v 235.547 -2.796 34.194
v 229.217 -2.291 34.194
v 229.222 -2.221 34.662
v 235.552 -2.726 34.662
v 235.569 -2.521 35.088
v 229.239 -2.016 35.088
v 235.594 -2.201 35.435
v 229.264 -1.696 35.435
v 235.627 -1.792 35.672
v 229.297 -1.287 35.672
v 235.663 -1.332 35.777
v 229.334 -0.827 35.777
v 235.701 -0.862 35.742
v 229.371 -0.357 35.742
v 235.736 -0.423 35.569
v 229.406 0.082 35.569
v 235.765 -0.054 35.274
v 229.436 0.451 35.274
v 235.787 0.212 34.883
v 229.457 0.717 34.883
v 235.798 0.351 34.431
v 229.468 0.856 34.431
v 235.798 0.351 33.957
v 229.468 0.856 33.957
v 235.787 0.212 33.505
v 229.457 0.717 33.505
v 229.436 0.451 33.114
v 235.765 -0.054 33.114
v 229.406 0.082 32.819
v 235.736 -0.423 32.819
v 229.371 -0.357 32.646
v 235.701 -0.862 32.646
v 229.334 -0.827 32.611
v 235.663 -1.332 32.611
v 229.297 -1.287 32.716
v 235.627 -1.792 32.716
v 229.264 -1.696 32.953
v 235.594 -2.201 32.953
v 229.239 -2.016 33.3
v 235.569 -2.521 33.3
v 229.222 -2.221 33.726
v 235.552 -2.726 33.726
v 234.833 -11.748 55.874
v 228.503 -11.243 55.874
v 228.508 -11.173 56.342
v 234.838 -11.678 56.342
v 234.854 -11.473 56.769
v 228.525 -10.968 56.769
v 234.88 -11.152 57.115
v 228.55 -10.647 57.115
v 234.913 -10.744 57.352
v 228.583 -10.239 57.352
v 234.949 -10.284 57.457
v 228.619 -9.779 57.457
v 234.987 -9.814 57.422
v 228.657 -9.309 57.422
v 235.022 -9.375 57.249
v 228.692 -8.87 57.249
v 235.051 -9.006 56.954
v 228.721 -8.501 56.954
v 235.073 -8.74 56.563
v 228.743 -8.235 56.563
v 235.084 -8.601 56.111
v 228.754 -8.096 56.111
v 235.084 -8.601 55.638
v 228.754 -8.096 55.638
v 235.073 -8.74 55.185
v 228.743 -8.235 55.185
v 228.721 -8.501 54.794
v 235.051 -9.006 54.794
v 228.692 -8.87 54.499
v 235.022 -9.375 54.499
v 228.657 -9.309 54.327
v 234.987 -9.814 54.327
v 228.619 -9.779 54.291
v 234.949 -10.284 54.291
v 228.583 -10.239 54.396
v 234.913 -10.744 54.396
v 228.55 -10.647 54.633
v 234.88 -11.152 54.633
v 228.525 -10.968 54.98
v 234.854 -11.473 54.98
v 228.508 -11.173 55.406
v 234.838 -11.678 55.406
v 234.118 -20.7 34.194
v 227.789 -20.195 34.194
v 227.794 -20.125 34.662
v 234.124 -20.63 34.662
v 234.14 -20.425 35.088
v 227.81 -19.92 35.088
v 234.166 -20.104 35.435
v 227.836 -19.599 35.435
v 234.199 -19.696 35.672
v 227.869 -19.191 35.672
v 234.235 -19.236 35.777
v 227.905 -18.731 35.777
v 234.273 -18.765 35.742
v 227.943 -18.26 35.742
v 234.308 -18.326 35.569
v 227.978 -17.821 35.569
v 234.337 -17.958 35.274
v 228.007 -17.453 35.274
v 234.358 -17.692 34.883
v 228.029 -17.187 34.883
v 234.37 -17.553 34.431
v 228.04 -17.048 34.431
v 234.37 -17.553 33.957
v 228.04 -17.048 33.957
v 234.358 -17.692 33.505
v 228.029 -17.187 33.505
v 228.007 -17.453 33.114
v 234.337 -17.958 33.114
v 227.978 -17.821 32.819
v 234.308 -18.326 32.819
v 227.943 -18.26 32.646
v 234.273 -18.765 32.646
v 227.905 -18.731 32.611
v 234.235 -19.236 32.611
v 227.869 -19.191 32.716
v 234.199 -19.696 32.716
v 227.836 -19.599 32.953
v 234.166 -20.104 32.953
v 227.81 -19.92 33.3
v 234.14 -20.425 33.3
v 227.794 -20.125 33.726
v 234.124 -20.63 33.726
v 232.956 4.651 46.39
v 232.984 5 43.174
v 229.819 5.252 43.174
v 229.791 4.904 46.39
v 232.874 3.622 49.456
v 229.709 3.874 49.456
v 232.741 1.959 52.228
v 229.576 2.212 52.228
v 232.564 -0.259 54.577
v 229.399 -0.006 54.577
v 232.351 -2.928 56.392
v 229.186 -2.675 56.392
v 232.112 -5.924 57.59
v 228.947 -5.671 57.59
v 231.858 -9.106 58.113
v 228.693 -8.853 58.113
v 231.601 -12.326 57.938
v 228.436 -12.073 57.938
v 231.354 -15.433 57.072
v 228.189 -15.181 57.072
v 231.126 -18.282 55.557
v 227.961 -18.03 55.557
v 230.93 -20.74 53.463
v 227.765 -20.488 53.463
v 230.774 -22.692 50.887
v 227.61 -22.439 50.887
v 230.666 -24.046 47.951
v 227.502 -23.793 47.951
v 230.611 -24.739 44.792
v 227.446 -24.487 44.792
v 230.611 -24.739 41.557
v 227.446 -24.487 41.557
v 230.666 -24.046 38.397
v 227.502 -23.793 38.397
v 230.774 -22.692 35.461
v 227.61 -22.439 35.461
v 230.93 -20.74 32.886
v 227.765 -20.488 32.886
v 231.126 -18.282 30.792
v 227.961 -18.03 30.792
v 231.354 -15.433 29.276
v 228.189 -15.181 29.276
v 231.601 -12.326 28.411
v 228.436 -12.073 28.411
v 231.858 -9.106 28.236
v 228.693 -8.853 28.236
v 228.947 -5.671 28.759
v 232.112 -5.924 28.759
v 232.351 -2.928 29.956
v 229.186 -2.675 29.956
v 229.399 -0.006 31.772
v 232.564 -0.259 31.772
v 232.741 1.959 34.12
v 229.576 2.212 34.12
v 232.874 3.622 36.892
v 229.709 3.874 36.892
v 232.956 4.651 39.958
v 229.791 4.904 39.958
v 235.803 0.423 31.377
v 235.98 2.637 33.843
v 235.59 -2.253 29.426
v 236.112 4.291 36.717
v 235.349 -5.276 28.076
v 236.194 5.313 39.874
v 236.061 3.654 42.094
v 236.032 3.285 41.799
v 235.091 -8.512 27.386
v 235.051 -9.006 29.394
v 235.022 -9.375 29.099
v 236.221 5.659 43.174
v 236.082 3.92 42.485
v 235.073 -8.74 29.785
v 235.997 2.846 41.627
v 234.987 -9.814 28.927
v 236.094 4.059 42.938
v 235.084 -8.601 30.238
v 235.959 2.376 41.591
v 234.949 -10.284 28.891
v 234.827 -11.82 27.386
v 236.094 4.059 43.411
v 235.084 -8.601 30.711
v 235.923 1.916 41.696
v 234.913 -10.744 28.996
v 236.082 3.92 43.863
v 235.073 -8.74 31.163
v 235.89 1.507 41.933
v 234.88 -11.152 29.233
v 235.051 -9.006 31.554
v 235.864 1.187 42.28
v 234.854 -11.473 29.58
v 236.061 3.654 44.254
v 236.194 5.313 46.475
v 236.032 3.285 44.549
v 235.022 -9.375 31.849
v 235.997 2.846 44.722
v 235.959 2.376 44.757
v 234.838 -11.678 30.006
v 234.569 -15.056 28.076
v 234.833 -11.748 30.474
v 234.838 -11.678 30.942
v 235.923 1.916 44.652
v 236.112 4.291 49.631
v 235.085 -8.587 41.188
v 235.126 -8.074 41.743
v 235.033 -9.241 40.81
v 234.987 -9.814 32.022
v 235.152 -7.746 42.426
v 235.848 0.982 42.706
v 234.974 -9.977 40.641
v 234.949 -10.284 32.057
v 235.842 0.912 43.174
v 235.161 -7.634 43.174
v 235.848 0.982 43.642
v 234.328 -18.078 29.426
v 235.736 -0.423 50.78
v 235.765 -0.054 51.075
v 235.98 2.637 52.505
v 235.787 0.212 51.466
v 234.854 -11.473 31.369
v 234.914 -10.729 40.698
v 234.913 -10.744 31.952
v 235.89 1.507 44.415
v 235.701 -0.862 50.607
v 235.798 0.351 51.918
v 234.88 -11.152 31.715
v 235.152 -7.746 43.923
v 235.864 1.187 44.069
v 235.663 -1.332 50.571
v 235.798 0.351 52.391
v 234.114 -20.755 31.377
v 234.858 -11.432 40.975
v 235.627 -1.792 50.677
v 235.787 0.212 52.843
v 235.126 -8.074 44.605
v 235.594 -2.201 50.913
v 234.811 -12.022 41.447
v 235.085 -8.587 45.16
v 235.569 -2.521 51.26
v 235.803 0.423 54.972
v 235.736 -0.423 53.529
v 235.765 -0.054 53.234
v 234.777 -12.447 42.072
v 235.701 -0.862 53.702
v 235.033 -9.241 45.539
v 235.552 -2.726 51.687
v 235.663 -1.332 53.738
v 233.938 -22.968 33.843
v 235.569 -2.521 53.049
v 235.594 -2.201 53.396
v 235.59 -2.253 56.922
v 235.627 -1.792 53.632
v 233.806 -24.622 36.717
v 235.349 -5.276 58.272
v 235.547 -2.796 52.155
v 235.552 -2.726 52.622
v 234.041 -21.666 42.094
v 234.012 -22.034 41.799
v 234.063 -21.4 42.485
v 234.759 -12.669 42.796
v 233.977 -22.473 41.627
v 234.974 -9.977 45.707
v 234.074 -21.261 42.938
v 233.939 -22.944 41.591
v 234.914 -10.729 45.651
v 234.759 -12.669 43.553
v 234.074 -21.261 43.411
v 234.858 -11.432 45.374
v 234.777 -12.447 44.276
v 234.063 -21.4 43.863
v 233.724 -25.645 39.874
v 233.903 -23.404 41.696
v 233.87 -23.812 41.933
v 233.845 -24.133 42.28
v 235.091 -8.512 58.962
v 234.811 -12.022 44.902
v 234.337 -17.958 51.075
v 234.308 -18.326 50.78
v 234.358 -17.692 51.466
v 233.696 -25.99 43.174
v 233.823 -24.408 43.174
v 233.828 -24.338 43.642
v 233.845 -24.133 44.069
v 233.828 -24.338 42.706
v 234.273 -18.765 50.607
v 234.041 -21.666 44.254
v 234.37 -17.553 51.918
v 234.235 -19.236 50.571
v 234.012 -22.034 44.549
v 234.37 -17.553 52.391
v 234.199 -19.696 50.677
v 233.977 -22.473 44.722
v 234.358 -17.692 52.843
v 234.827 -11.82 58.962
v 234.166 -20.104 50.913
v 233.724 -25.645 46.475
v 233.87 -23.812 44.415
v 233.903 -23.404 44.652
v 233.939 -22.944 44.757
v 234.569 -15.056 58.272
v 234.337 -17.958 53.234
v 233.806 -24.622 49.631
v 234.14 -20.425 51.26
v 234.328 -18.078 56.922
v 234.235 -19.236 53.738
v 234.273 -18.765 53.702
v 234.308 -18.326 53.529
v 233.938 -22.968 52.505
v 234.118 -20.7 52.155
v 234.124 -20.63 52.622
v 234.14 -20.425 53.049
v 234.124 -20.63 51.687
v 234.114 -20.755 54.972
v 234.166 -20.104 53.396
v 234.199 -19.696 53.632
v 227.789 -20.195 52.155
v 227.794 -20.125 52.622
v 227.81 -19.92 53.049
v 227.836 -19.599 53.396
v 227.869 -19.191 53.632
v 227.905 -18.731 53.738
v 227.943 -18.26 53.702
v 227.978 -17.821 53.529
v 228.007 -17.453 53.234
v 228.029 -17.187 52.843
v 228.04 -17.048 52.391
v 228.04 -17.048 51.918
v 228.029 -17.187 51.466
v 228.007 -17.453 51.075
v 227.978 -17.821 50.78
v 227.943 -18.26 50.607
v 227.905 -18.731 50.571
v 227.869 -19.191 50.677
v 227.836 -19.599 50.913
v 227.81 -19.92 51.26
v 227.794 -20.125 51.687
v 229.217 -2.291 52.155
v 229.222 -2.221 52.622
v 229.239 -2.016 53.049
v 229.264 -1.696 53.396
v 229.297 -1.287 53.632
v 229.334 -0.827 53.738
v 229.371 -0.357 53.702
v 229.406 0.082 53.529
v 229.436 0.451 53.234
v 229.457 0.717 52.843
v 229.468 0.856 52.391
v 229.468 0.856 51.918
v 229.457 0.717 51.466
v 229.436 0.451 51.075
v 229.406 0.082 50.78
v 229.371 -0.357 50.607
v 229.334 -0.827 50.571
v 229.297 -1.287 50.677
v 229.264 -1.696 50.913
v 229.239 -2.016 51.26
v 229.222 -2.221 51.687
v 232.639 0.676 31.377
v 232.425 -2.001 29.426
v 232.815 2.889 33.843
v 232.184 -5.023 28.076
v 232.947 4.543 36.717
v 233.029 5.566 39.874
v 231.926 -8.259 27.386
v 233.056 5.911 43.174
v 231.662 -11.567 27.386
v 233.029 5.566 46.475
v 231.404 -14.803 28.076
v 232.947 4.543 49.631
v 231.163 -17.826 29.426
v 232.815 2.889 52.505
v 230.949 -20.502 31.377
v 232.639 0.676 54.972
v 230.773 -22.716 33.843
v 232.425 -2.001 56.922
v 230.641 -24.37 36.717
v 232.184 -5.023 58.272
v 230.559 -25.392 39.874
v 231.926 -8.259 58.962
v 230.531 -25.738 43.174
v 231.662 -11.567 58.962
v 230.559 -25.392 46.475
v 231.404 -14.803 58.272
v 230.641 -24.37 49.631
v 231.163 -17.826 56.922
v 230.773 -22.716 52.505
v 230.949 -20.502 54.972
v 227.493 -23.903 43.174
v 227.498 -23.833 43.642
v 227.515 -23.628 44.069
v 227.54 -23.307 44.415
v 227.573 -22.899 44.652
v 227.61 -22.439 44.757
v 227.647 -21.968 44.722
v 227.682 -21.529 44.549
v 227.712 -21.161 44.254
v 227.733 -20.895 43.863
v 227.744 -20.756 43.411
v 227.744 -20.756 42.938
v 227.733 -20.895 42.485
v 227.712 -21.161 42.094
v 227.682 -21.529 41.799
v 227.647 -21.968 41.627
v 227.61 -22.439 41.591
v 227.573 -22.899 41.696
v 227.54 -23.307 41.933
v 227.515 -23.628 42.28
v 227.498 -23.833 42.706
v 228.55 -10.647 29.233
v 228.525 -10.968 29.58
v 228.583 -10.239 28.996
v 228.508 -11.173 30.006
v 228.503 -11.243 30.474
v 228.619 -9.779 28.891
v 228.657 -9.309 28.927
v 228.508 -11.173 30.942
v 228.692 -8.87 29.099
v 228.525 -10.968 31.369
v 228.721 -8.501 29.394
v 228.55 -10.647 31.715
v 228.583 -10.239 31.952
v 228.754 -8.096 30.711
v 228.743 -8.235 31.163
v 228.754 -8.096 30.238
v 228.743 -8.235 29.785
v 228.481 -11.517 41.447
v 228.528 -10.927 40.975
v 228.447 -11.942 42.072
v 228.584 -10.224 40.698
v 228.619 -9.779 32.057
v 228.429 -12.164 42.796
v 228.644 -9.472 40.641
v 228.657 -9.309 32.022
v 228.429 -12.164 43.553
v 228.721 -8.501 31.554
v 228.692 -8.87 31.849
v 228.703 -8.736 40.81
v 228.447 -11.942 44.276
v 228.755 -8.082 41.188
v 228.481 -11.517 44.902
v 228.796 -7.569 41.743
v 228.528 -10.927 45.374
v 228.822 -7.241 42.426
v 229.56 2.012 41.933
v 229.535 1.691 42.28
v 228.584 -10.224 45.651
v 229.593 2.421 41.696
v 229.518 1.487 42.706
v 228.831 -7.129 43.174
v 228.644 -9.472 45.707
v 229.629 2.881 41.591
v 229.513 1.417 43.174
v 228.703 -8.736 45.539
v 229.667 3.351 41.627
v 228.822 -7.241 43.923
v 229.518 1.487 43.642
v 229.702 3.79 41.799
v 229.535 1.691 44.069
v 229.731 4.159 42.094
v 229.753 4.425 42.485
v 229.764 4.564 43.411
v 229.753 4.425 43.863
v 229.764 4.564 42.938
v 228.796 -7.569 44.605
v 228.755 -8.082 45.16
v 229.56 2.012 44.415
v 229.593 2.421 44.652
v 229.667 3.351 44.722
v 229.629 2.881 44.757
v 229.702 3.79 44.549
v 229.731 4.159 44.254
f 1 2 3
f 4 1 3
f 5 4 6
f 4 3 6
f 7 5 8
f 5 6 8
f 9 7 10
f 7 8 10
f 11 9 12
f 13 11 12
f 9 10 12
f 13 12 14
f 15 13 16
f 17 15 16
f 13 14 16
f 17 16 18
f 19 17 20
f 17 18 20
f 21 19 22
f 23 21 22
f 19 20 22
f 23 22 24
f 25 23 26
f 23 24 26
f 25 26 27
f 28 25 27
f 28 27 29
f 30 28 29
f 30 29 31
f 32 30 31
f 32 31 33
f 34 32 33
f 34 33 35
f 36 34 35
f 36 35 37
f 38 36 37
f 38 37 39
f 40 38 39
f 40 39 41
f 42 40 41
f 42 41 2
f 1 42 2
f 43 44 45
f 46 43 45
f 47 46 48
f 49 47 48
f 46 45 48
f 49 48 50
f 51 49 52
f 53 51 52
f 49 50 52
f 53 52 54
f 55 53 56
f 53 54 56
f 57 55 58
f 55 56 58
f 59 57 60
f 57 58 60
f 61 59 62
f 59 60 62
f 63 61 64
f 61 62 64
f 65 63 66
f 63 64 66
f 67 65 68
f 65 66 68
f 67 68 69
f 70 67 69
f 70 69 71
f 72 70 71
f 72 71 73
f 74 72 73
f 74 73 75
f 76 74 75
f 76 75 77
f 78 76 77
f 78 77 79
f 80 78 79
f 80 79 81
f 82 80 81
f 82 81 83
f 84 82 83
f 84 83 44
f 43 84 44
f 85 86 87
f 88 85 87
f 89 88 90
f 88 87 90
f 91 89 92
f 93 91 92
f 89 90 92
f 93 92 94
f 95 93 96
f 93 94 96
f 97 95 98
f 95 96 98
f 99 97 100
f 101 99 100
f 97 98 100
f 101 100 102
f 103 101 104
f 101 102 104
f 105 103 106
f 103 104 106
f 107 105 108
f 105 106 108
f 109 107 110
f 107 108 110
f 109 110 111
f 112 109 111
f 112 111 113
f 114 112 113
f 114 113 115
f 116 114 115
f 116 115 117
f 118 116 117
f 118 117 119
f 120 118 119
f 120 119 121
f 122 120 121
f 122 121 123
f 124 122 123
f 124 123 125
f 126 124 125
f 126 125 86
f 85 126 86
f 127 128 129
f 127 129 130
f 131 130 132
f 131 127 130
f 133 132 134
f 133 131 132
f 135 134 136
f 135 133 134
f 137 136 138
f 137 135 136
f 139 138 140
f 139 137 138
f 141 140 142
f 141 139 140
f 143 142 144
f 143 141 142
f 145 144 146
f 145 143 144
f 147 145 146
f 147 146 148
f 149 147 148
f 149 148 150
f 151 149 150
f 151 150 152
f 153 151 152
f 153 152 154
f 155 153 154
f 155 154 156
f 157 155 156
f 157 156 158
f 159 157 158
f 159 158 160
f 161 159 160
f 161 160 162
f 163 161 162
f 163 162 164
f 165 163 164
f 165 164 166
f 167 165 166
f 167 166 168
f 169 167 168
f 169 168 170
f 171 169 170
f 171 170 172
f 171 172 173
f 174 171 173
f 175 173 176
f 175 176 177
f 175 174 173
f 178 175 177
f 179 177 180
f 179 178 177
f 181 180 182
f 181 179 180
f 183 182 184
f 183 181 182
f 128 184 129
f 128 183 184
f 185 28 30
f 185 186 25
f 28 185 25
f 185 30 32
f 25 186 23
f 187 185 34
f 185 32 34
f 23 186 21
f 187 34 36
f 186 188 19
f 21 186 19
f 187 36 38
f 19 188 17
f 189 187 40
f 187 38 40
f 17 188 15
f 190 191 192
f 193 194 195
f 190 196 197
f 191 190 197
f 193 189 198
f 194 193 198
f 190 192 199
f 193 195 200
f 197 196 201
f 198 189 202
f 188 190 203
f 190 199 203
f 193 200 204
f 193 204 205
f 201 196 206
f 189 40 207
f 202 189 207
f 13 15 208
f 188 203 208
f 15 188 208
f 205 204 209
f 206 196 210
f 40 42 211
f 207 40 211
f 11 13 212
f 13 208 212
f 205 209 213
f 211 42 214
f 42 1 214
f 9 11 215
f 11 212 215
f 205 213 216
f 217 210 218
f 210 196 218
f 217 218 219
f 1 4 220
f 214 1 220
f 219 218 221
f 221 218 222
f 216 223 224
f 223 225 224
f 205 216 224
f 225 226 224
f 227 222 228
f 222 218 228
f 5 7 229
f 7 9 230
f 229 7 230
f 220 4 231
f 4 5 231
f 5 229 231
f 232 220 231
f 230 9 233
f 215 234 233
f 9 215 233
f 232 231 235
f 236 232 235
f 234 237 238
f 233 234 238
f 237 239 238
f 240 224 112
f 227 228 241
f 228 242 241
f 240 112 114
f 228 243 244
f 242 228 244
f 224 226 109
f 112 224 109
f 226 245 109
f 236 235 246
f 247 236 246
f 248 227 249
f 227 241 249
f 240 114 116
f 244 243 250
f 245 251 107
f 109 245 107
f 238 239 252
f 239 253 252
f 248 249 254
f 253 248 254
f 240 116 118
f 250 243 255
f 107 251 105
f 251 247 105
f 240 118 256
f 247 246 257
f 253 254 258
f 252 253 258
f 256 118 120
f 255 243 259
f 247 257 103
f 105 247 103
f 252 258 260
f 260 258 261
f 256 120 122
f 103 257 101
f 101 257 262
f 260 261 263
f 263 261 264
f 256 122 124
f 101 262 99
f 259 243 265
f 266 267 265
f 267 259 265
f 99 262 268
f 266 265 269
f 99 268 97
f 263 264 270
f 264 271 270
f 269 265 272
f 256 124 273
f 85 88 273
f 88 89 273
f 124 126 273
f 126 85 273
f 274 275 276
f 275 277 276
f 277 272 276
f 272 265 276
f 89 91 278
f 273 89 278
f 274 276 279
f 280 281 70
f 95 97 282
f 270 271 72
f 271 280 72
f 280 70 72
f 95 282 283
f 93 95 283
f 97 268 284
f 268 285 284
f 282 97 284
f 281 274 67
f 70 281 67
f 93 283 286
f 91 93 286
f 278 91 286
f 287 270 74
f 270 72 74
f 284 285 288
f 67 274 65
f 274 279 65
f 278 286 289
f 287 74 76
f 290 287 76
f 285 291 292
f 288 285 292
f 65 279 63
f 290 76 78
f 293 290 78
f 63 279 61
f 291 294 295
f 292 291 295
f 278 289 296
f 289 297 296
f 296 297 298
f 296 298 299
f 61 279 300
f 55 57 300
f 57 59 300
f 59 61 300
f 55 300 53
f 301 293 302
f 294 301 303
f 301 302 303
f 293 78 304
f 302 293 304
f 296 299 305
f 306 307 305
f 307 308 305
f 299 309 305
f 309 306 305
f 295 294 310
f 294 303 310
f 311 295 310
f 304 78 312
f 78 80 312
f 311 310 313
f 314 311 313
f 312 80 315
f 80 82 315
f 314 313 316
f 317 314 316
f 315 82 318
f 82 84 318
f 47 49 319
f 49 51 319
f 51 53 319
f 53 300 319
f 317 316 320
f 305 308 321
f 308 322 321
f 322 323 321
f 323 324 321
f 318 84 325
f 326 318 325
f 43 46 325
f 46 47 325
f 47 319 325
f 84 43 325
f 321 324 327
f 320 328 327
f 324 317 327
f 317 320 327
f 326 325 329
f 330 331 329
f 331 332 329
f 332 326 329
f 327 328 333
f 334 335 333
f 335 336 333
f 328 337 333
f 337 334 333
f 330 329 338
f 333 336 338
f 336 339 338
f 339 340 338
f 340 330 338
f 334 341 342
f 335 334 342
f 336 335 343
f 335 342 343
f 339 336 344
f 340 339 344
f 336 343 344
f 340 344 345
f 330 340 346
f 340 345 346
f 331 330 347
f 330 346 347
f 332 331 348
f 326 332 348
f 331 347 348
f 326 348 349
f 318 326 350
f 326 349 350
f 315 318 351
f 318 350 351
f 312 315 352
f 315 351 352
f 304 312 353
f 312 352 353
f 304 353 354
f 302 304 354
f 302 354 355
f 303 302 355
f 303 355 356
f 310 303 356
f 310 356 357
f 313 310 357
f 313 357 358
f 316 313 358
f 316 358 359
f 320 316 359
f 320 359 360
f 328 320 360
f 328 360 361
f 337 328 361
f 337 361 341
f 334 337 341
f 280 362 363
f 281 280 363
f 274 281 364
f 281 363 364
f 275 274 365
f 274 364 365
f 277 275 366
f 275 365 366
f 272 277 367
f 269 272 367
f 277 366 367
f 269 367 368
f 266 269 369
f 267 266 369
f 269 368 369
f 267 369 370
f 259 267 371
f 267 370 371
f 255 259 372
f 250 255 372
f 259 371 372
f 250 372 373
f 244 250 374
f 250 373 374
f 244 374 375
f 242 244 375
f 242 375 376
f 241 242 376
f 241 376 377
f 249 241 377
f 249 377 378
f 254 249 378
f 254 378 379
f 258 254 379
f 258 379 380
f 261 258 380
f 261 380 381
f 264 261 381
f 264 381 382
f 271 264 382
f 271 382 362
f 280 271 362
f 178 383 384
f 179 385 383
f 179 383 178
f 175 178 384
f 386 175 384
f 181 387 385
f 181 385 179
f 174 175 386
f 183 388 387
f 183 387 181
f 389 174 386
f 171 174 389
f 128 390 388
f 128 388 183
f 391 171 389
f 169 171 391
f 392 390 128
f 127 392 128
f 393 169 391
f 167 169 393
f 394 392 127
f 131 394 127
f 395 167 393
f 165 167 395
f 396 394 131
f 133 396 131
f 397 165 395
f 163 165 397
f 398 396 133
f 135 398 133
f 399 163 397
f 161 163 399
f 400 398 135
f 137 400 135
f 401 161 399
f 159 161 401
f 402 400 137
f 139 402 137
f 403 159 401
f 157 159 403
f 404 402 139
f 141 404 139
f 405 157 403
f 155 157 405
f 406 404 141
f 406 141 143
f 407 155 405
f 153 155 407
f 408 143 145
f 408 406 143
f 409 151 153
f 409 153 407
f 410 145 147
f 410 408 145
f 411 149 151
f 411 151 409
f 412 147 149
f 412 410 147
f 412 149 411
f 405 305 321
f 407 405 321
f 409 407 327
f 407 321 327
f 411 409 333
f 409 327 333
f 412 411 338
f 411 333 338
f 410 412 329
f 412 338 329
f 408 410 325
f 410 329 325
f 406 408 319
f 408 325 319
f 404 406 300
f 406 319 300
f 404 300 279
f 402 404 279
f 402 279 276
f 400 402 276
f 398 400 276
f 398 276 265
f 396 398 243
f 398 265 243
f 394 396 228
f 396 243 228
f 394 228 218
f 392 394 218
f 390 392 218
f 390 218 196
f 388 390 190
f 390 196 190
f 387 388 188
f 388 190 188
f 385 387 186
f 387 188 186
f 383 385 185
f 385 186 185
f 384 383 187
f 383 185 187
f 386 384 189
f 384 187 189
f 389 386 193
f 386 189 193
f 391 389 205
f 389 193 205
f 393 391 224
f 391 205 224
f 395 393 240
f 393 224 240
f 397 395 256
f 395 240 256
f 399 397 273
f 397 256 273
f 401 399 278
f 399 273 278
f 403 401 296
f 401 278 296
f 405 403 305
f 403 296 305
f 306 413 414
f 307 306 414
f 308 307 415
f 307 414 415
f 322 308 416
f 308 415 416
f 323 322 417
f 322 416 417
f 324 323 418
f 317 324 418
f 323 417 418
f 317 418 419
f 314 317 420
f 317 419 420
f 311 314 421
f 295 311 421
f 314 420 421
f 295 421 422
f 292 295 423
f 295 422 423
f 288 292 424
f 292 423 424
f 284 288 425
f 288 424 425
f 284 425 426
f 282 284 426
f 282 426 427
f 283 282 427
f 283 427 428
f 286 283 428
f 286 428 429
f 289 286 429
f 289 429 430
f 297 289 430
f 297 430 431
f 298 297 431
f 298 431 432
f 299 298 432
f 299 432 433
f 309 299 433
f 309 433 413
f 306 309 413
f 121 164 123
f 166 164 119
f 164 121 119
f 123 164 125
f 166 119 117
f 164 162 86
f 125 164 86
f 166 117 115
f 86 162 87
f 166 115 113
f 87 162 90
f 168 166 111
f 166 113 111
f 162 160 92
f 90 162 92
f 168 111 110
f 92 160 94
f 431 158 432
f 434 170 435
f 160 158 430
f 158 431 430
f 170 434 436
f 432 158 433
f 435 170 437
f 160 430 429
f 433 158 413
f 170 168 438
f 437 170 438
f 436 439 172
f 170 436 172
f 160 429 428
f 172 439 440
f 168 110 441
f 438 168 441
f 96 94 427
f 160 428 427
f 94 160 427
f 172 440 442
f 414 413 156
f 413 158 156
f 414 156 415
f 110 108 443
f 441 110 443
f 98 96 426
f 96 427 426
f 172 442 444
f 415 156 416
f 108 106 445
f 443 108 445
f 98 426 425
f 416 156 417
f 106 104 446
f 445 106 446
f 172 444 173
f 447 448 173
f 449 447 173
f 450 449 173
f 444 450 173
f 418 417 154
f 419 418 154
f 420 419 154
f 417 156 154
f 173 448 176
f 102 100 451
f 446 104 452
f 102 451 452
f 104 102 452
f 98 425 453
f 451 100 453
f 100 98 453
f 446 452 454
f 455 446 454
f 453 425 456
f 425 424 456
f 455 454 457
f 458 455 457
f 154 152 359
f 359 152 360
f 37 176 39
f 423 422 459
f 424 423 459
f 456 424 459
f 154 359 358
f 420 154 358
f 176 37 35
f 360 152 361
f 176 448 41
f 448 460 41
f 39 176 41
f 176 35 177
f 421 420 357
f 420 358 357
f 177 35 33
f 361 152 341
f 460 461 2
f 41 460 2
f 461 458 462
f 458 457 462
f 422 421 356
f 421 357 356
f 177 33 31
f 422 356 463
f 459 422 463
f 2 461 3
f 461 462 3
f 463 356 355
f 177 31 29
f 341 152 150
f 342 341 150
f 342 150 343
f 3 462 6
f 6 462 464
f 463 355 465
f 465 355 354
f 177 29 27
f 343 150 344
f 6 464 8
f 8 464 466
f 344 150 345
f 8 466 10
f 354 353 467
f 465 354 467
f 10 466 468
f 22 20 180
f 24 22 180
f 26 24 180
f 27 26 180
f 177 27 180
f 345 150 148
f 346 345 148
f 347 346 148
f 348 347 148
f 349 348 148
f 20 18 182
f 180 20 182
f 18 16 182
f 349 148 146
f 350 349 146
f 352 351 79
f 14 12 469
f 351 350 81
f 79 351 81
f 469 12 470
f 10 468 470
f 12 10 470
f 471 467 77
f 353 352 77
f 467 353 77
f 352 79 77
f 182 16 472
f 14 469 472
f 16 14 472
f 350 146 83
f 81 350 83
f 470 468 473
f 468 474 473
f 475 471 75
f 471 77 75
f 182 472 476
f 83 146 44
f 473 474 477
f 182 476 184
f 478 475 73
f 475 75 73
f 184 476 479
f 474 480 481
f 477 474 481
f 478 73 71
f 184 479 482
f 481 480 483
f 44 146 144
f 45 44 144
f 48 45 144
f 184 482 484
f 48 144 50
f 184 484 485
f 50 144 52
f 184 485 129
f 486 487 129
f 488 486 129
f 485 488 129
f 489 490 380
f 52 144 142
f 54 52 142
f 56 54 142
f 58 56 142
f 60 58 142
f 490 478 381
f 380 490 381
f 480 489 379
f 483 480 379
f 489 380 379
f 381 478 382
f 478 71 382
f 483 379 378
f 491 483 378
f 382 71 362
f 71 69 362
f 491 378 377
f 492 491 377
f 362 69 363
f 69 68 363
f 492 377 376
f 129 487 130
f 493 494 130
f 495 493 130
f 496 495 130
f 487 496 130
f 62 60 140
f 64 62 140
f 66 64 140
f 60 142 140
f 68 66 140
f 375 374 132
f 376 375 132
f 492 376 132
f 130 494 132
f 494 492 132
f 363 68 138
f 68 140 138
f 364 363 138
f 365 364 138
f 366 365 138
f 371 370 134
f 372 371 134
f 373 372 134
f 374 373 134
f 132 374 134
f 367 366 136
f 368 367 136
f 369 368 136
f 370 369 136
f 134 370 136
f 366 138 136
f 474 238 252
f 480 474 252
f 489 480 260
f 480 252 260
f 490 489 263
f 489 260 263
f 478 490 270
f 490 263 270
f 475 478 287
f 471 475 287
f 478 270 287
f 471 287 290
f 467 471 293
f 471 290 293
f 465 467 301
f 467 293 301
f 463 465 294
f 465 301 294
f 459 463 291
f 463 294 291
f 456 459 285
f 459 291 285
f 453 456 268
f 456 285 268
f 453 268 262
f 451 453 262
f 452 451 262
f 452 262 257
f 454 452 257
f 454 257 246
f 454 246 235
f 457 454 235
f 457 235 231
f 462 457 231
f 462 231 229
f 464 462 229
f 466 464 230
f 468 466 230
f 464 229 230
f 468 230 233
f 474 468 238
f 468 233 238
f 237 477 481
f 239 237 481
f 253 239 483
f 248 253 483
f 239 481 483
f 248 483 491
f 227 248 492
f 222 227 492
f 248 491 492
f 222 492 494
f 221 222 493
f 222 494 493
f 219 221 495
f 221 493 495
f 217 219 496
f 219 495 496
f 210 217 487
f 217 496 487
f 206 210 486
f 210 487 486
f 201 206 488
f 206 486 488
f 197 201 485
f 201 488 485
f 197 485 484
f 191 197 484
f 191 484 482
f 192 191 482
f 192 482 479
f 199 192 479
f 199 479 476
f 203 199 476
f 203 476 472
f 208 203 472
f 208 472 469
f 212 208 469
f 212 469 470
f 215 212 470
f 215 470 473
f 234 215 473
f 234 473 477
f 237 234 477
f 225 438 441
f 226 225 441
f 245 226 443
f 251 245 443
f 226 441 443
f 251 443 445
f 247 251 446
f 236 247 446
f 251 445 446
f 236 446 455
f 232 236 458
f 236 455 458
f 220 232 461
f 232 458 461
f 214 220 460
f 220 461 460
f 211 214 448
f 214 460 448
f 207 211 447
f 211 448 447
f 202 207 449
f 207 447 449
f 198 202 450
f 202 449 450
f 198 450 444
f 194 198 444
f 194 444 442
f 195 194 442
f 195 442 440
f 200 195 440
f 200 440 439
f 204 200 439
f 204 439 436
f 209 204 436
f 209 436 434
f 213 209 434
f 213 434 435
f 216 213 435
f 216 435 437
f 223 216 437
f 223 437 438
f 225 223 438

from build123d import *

# Parameters (mm, degrees)
SKETCH1_R           = 14.9606
BOSS_EXTRUDE1_DEPTH = 6.35
SKETCH2_R           = 2.54
CUT_EXTRUDE1_DEPTH  = 6.35
SKETCH3_R           = 1.5875
CUT_EXTRUDE2_DEPTH  = 10
SKETCH5_R           = 15.875
SKETCH5_R_2         = 14.9606
BOSS_EXTRUDE2_DEPTH = 3.175


with BuildPart() as part:
    # Sketch1 → Boss-Extrude1 (new body)
    with BuildSketch(Plane(origin=(234.278878836, -18.689027227, 0), x_dir=(0, 0, -1), z_dir=(0.9968332748770866, -0.0795199477981641, 0))):
        with Locations((-43.174261814, 8.550344032)):
            Circle(SKETCH1_R)
    extrude(amount=-BOSS_EXTRUDE1_DEPTH)

    # Sketch2 → Cut-Extrude1 (cut)
    with BuildSketch(Plane(origin=(234.278878836, -18.689027227, 0), x_dir=(0, 0, -1), z_dir=(0.9968332748770866, -0.07951994779816411, 0))):
        with Locations((-43.174261814, 8.550344032)):
            Circle(SKETCH2_R)
    extrude(amount=-CUT_EXTRUDE1_DEPTH, mode=Mode.SUBTRACT)

    # Sketch3 → Cut-Extrude2 (cut)
    with BuildSketch(Plane(origin=(227.94898754, -18.184075559, 0), x_dir=(0, 0, 1), z_dir=(-0.9968332748770866, 0.07951994779816411, 0))):
        with Locations((43.174261814, 21.250344032)):
            Circle(SKETCH3_R)
        with Locations((52.154517935, 17.530600153)):
            Circle(SKETCH3_R)
        with Locations((55.874261814, 8.550344032)):
            Circle(SKETCH3_R)
        with Locations((52.154517935, -0.429912089)):
            Circle(SKETCH3_R)
        with Locations((43.174261814, -4.149655968)):
            Circle(SKETCH3_R)
        with Locations((34.194005693, -0.429912089)):
            Circle(SKETCH3_R)
        with Locations((30.474261814, 8.550344032)):
            Circle(SKETCH3_R)
        with Locations((34.194005693, 17.530600153)):
            Circle(SKETCH3_R)
    extrude(amount=-CUT_EXTRUDE2_DEPTH, mode=Mode.SUBTRACT)

    # Sketch5 → Boss-Extrude2 (add)
    with BuildSketch(Plane(origin=(234.278878836, -18.689027227, 0), x_dir=(0, 0, 1), z_dir=(-0.9968332748770866, 0.07951994779816411, 0))):
        with Locations((43.174261814, 8.550344032)):
            Circle(SKETCH5_R)
        with Locations((43.174261814, 8.550344032)):
            Circle(SKETCH5_R_2, mode=Mode.SUBTRACT)
    extrude(amount=BOSS_EXTRUDE2_DEPTH)


solid = part.part
